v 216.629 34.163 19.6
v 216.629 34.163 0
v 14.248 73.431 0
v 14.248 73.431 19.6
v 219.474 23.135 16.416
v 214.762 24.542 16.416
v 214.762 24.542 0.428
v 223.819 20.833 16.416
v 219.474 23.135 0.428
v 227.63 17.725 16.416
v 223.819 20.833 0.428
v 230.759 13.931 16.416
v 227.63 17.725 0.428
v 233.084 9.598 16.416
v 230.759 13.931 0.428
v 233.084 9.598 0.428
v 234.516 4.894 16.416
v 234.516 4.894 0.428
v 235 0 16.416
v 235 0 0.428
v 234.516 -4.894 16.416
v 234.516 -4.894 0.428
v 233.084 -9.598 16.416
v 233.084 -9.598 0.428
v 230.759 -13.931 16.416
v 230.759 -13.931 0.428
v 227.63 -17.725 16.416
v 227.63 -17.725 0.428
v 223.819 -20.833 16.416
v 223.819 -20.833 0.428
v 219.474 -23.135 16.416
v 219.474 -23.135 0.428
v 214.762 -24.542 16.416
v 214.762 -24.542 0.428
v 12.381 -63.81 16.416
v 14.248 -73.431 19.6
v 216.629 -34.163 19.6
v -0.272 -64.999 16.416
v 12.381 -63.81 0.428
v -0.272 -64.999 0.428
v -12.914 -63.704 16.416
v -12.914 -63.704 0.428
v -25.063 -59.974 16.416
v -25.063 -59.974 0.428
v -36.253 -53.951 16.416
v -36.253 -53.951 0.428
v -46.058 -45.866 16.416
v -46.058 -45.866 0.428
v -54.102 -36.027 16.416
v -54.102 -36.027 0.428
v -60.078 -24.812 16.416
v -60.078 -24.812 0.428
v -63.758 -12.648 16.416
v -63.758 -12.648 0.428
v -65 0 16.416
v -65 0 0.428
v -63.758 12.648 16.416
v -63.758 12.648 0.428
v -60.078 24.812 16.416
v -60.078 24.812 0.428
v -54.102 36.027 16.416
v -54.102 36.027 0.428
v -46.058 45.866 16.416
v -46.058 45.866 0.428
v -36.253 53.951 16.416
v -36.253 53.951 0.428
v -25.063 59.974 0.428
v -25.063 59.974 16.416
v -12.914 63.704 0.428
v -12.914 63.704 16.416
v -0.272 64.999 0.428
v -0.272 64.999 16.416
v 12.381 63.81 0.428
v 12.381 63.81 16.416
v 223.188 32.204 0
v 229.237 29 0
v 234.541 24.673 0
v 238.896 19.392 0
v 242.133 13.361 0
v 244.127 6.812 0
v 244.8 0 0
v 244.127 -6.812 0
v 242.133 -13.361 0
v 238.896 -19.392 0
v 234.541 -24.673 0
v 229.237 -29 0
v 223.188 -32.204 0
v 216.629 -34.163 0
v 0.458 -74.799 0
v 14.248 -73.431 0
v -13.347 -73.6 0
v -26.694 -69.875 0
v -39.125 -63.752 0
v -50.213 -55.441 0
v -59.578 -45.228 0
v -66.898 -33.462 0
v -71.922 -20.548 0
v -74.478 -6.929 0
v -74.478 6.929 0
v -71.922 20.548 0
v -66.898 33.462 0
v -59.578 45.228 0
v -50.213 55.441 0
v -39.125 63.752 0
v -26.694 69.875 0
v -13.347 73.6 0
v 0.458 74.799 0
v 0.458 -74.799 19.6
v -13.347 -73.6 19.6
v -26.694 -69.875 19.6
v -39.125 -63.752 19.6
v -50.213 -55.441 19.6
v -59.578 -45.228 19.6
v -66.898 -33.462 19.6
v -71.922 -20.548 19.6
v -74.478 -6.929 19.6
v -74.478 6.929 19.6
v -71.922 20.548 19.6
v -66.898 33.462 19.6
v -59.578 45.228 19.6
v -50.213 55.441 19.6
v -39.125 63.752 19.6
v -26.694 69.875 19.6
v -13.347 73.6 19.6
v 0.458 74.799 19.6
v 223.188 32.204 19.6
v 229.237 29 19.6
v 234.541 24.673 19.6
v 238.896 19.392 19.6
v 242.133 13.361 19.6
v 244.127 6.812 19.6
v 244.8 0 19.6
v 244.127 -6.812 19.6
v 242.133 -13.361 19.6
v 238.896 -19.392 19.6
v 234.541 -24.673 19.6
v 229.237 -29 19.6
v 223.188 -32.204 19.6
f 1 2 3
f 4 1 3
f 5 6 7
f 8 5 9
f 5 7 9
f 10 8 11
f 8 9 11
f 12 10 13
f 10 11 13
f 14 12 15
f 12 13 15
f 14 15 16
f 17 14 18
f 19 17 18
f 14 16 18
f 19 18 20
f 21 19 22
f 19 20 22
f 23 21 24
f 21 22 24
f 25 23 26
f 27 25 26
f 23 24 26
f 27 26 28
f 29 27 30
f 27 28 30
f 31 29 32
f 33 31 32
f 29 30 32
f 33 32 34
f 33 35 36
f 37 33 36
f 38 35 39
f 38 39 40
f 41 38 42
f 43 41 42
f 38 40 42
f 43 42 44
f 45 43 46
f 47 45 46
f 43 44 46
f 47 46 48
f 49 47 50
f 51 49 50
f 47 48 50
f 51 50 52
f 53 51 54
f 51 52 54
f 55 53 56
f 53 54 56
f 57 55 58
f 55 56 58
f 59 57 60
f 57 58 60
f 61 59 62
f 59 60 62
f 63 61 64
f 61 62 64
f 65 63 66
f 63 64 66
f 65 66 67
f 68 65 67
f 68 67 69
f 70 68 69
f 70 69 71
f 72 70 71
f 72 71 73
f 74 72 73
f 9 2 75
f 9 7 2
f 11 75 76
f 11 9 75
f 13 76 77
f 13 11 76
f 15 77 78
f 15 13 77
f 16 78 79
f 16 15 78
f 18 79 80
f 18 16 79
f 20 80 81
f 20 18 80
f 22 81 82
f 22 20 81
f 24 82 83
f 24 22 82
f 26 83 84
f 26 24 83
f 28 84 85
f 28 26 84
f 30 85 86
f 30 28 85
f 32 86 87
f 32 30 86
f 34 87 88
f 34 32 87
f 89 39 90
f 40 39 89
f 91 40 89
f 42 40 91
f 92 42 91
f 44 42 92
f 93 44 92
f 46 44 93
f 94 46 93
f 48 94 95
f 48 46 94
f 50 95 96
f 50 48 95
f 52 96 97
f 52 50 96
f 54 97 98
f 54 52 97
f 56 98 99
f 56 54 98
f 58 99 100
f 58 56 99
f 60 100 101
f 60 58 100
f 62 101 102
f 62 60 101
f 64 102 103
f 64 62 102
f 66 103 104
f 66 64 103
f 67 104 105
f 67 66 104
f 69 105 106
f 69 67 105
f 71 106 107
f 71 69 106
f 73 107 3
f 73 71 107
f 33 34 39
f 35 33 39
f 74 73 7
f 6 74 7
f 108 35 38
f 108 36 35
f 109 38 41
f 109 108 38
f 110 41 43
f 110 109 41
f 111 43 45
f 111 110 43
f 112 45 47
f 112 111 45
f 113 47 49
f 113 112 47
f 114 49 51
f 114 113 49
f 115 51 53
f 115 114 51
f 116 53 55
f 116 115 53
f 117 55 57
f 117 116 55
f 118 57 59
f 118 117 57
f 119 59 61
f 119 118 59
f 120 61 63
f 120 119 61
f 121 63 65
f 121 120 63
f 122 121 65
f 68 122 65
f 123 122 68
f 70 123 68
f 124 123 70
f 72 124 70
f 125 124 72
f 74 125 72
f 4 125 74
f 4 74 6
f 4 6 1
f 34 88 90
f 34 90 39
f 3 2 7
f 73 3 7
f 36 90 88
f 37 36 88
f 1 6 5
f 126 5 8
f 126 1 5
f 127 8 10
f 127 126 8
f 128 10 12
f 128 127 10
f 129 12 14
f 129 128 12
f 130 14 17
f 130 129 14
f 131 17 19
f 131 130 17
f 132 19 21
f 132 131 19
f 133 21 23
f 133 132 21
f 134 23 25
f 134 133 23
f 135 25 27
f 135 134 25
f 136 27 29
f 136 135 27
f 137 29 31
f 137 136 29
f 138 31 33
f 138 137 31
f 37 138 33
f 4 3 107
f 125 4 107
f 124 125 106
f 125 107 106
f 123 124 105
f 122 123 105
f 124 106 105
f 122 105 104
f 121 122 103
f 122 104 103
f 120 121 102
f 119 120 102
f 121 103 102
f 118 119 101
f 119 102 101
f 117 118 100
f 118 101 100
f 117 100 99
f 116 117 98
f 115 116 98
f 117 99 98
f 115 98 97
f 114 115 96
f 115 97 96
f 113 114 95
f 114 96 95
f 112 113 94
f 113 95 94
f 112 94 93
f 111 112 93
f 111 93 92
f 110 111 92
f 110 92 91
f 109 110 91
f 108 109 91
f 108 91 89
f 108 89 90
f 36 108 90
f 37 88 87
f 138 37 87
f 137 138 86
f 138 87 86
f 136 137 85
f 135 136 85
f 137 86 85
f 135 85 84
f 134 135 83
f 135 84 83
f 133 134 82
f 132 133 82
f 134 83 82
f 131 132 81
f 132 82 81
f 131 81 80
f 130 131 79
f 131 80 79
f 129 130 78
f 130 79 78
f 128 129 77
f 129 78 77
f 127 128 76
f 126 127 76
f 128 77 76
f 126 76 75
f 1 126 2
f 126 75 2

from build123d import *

# Parameters (mm, degrees)
BOSS_EXTRUDE2_DEPTH = 19.6
CHAMFER1_SIZE       = 3.184213023
CHAMFER1_SIZE_2     = 9.8
CHAMFER2_SIZE       = 9.8
CHAMFER2_SIZE_2     = 0.427877241


with BuildPart() as part:
    # Sketch4 → Boss-Extrude2 (new body)
    with BuildSketch(Plane.XY):
        with BuildLine():
            Line((14.247619048, -73.430547809), (216.628571429, -34.162875184))
            ThreePointArc((216.628571429, -34.162875184), (244.8, 0), (216.628571429, 34.162875184))
            Line((216.628571429, 34.162875184), (14.247619048, 73.430547809))
            ThreePointArc((14.247619048, 73.430547809), (-74.8, 0), (14.247619048, -73.430547809))
        make_face()
        with BuildLine():
            Line((12.380952381, 63.809968016), (214.761904762, 24.542295391))
            ThreePointArc((214.761904762, 24.542295391), (235, 0), (214.761904762, -24.542295391))
            Line((214.761904762, -24.542295391), (12.380952381, -63.809968016))
            ThreePointArc((12.380952381, -63.809968016), (-65, 0), (12.380952381, 63.809968016))
        make_face(mode=Mode.SUBTRACT)
    extrude(amount=BOSS_EXTRUDE2_DEPTH)

    # Chamfer1
    # the kernel refuses this chamfer: 9.8, 3.184213023 mm, written as the material it takes off along each edge
    with BuildSketch(Plane(origin=(0, 0, 19.6), x_dir=(0.19047619047619063, -0.9816918156232525, 0), z_dir=(0.9816918156232525, 0.19047619047619063, 0))) as chamfer1_piece_1:
        Polygon((65, CHAMFER1_SIZE), (65 + CHAMFER1_SIZE_2, 0), (65, 0), align=None)
    revolve(axis=Axis((0, 0, 19.6), (0, 0, -1)), revolution_arc=201.961150855, mode=Mode.SUBTRACT)
    with BuildSketch(Plane(origin=(214.761904762, -24.542295391, 19.6), x_dir=(-0.021348671206160026, 0.1100285329369752, -0.9936991275921844), z_dir=(-0.9816918156232526, -0.1904761904761905, 0)), Plane(origin=(12.380952381, 63.809968016, 19.6), x_dir=(-0.021348671206159867, -0.1100285329369744, -0.9936991275921844), z_dir=(0.9816918156232526, -0.1904761904761905, 0))) as chamfer1_piece_2:
        Polygon((CHAMFER1_SIZE * 0.993699127618, CHAMFER1_SIZE * 0.112080523835), (-CHAMFER1_SIZE_2 * 0.112080523832, CHAMFER1_SIZE_2 * 0.993699127592), (0, 0), align=None)
    extrude(amount=206.155281281, mode=Mode.SUBTRACT)
    with BuildSketch(Plane(origin=(210, 0, 19.6), x_dir=(0.19047619047619035, 0.9816918156232525, 0), z_dir=(-0.9816918156232525, 0.19047619047619035, 0))) as chamfer1_piece_3:
        Polygon((25, CHAMFER1_SIZE), (25 + CHAMFER1_SIZE_2, 0), (25, 0), align=None)
    revolve(axis=Axis((210, 0, 19.6), (0, 0, -1)), revolution_arc=158.038849145, mode=Mode.SUBTRACT)

    # Chamfer2
    # the kernel refuses this chamfer: 9.8, 0.427877241 mm, written as the material it takes off along each edge
    with BuildSketch(Plane(origin=(0, 0, 0), x_dir=(0.19047619047619063, -0.9816918156232525, 0), z_dir=(0.9816918156232525, 0.19047619047619063, 0))) as chamfer2_piece_1:
        Polygon((65 + CHAMFER2_SIZE, 0), (65, -CHAMFER2_SIZE_2 * 0.999999998839), (65, 0), align=None)
    revolve(axis=Axis((0, 0, 0), (0, 0, -1)), revolution_arc=201.961150855, mode=Mode.SUBTRACT)
    with BuildSketch(Plane(origin=(214.761904762, -24.542295391, 0), x_dir=(0.1904759224026141, -0.9816904340036641, -0.0016777278000430975), z_dir=(-0.9816918156232526, -0.1904761904761905, 0)), Plane(origin=(12.380952381, 63.809968016, 0), x_dir=(0.19047592240261413, 0.9816904340036641, -0.0016777278000430988), z_dir=(0.9816918156232526, -0.1904761904761905, 0))) as chamfer2_piece_2:
        Polygon((CHAMFER2_SIZE * 0.999998592614, CHAMFER2_SIZE * 0.00167772780004), (-CHAMFER2_SIZE_2 * 0.0016777277981, CHAMFER2_SIZE_2 * 0.999998591453), (0, 0), align=None)
    extrude(amount=206.155281281, mode=Mode.SUBTRACT)
    with BuildSketch(Plane(origin=(210, 0, 0), x_dir=(0.19047619047619035, 0.9816918156232525, 0), z_dir=(-0.9816918156232525, 0.19047619047619035, 0))) as chamfer2_piece_3:
        Polygon((25 + CHAMFER2_SIZE, 0), (25, -CHAMFER2_SIZE_2 * 0.999999998839), (25, 0), align=None)
    revolve(axis=Axis((210, 0, 0), (0, 0, -1)), revolution_arc=158.038849145, mode=Mode.SUBTRACT)


solid = part.part
